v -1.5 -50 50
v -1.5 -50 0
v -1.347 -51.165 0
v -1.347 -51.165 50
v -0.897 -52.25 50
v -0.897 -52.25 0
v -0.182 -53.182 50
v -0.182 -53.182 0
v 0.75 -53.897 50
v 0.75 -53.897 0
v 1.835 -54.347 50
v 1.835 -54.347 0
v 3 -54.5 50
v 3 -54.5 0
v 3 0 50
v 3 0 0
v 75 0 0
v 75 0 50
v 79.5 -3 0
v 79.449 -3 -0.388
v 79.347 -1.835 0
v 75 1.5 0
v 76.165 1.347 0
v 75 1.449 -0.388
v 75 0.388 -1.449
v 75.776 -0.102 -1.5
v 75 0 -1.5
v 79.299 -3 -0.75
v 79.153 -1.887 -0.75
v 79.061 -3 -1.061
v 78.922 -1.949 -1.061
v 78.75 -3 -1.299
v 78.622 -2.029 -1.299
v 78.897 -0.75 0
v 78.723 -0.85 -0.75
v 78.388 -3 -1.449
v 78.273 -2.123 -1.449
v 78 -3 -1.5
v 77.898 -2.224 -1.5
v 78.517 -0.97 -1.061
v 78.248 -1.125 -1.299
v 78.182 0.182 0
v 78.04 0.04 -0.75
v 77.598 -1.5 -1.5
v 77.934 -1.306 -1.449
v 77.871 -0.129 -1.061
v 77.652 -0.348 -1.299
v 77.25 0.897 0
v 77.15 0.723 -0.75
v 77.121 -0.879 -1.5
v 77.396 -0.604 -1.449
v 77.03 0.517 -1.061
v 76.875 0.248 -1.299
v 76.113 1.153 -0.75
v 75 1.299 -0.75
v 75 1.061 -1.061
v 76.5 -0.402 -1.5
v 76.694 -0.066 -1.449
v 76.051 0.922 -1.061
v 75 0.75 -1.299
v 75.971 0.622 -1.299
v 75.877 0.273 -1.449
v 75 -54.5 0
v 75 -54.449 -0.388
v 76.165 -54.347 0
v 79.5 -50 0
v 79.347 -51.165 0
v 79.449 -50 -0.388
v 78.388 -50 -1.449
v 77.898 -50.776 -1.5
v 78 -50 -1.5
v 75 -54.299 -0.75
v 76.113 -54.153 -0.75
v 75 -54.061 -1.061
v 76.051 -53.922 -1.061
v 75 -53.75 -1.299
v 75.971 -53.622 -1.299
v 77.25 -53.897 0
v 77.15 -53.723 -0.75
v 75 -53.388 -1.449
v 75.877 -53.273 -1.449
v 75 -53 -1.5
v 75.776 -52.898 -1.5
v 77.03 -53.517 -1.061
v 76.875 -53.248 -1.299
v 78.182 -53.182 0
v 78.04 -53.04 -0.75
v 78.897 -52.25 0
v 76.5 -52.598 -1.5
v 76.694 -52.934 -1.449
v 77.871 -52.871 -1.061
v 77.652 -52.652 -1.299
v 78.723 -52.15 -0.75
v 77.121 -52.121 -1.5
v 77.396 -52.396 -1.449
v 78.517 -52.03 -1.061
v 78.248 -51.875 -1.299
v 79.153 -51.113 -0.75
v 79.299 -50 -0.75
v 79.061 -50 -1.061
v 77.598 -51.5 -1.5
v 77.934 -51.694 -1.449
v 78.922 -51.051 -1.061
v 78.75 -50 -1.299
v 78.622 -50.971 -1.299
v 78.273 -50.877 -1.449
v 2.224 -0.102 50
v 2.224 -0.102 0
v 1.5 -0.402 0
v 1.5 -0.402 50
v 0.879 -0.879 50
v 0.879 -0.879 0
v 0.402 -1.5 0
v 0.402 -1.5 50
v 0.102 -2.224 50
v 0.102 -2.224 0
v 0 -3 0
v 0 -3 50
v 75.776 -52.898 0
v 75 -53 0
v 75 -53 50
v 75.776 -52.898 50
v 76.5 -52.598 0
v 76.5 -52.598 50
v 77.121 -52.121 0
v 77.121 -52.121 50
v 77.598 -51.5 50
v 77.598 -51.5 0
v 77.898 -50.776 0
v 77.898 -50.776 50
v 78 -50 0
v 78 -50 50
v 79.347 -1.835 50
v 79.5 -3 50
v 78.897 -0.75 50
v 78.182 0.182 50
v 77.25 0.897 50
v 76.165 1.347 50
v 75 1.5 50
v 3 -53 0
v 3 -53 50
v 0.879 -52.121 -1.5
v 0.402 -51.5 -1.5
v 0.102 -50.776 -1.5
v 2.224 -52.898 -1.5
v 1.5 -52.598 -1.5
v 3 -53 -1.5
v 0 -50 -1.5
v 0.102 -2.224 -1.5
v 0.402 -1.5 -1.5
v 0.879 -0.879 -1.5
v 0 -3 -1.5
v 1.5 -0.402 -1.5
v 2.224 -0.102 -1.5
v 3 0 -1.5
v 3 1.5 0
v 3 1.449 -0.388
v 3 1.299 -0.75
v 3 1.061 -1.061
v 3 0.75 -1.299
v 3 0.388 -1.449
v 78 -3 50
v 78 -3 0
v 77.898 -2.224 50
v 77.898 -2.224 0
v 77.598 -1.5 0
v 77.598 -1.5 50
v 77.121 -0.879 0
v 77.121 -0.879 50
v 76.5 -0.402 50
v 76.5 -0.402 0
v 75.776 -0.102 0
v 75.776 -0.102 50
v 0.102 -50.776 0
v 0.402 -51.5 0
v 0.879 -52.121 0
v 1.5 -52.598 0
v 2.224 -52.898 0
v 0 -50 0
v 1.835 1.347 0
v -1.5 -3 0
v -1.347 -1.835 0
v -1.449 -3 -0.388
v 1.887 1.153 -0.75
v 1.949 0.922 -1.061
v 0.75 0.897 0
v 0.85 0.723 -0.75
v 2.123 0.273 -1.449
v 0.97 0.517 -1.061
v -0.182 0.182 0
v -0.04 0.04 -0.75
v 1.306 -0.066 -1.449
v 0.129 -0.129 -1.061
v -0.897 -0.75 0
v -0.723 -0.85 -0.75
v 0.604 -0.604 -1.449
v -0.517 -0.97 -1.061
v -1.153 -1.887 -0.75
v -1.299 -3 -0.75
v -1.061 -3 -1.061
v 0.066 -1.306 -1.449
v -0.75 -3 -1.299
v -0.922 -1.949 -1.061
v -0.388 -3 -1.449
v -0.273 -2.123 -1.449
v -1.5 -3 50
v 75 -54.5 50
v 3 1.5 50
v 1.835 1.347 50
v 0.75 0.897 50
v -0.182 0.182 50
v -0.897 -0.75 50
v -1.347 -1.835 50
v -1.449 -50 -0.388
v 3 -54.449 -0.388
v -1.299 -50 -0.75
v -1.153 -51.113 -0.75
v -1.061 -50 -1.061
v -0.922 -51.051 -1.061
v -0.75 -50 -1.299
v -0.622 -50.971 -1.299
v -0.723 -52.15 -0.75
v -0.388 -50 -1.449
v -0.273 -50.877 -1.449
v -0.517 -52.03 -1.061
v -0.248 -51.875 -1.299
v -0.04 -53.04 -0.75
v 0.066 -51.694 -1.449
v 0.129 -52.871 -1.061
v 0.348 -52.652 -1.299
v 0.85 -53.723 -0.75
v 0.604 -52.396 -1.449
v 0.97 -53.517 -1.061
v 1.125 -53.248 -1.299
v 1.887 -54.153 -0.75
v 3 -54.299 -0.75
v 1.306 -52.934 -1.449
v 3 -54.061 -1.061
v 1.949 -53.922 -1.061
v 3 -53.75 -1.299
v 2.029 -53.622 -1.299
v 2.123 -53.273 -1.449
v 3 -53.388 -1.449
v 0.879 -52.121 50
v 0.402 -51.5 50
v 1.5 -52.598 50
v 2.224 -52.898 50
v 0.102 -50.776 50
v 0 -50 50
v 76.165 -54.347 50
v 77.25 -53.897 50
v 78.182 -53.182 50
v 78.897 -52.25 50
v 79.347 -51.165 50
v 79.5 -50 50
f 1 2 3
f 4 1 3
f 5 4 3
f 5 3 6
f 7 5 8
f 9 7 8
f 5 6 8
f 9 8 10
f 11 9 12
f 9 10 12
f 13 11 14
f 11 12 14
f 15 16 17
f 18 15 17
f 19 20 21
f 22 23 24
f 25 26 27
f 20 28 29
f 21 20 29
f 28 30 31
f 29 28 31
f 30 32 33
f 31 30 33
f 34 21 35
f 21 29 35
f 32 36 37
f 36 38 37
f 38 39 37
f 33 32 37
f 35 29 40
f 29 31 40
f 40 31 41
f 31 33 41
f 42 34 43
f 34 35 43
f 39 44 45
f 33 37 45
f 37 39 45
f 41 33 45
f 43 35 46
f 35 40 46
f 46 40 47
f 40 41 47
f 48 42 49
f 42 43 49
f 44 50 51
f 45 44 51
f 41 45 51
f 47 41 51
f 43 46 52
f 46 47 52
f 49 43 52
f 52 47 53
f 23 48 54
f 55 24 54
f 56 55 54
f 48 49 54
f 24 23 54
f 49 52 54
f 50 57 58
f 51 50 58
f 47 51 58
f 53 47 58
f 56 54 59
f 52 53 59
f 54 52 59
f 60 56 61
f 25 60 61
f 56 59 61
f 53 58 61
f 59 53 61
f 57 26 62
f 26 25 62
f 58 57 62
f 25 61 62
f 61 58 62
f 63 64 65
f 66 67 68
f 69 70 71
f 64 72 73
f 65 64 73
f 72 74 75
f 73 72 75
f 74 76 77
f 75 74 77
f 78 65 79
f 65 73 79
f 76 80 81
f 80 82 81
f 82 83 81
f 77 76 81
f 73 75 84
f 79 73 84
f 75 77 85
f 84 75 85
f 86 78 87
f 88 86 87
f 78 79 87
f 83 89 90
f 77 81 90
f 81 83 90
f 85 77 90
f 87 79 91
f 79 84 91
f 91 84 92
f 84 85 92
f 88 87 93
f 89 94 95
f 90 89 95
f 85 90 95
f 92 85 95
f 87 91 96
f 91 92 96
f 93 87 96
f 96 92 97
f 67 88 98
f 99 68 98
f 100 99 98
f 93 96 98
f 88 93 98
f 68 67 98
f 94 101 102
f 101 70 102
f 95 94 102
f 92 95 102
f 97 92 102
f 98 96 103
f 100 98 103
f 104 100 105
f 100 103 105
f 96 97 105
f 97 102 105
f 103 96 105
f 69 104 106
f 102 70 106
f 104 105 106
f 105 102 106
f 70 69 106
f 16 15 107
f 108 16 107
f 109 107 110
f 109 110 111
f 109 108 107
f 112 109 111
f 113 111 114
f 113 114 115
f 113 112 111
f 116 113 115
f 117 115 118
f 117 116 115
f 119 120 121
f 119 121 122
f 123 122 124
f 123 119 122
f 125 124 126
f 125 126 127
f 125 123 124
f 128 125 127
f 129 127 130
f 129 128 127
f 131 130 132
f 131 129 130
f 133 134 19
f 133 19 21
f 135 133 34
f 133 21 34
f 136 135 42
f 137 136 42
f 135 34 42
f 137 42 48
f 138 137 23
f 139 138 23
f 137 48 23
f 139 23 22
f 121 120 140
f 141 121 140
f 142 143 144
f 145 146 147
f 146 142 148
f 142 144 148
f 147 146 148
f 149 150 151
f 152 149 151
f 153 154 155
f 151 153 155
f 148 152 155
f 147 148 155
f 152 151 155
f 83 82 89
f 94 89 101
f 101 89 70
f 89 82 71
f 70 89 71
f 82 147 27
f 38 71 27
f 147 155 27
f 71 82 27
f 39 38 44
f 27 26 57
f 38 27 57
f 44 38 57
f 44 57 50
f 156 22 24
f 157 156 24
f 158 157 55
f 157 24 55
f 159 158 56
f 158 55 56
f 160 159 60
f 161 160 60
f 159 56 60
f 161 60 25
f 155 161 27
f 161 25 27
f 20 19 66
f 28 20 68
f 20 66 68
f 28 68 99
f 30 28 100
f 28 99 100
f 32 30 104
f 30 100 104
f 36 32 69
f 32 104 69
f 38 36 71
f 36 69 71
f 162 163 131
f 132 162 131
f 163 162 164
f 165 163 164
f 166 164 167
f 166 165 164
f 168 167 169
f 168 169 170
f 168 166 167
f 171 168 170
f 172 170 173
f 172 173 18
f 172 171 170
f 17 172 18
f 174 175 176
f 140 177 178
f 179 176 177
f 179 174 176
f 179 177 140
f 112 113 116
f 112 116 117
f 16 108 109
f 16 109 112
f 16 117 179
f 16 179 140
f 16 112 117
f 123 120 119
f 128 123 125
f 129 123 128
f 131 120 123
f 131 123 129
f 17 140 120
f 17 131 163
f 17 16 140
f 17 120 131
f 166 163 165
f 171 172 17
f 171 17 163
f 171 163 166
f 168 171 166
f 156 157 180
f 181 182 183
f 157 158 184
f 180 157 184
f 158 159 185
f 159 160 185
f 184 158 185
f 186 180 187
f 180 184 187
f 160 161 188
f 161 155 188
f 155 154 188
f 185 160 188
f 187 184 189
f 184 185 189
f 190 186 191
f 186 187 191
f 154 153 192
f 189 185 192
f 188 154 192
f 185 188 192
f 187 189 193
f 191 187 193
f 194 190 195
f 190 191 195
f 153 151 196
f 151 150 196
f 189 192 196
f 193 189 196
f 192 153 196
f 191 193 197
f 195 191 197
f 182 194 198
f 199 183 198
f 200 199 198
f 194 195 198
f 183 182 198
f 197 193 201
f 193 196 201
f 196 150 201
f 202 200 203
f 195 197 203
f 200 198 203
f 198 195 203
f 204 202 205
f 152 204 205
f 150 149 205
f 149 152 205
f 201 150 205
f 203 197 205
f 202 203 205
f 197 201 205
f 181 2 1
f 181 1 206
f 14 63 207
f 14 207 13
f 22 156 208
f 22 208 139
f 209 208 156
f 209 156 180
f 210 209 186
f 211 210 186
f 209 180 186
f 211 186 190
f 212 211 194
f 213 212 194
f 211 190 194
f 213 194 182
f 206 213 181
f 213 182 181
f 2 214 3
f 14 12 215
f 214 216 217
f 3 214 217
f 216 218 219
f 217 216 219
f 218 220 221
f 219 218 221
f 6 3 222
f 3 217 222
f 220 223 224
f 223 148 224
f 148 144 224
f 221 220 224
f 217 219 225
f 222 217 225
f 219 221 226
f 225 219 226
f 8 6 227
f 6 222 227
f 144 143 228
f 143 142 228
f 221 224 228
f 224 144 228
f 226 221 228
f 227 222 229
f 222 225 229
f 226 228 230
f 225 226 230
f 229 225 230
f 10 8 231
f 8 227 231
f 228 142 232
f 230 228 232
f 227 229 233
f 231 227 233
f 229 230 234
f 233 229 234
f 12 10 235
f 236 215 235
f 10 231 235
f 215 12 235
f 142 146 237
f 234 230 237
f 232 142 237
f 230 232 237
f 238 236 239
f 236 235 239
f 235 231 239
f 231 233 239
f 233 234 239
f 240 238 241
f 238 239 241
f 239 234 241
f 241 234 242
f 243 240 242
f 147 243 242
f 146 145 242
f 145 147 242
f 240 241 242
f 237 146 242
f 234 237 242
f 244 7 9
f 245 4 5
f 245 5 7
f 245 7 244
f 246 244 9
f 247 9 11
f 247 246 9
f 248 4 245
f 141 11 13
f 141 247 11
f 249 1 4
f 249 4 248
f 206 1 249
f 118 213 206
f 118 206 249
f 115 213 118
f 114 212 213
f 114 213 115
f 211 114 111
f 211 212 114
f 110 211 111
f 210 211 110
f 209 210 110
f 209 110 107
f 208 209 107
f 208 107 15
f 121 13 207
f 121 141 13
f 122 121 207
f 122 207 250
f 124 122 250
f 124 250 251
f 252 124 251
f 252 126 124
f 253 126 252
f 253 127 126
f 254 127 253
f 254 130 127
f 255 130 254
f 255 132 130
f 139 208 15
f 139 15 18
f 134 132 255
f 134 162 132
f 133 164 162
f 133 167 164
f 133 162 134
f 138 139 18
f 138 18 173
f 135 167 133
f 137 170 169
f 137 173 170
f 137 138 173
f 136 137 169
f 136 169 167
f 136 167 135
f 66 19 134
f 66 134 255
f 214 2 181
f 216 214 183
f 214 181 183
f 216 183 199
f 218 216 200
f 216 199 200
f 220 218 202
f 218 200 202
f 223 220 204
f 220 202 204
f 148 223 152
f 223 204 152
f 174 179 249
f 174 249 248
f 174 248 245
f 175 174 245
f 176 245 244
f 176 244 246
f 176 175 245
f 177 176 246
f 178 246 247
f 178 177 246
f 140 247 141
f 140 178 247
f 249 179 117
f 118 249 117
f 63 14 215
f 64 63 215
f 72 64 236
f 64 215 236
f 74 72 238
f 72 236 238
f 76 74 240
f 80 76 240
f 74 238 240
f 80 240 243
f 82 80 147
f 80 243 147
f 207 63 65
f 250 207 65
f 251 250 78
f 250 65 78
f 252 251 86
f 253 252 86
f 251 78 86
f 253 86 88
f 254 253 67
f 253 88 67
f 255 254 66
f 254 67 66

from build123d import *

# Parameters (mm, degrees)
PAD_DEPTH   = 50
THICKNESS_T = 1.5


with BuildPart() as part:
    # Sketch → Pad (new body)
    with BuildSketch(Plane.XY):
        with BuildLine():
            ThreePointArc((3, 0), (0.87868, -0.87868), (0, -3))
            Line((0, -50), (0, -3))
            ThreePointArc((0, -50), (0.87868, -52.12132), (3, -53))
            Line((75, -53), (3, -53))
            ThreePointArc((75, -53), (77.12132, -52.12132), (78, -50))
            Line((78, -3), (78, -50))
            ThreePointArc((78, -3), (77.12132, -0.87868), (75, 0))
            Line((3, 0), (75, 0))
        make_face()
    extrude(amount=PAD_DEPTH)

    # Thickness
    thickness_openings = [part.faces().sort_by_distance(p)[0] for p in [
        (39, -26.5, 50),
    ]]
    offset(amount=THICKNESS_T, openings=thickness_openings)


solid = part.part
